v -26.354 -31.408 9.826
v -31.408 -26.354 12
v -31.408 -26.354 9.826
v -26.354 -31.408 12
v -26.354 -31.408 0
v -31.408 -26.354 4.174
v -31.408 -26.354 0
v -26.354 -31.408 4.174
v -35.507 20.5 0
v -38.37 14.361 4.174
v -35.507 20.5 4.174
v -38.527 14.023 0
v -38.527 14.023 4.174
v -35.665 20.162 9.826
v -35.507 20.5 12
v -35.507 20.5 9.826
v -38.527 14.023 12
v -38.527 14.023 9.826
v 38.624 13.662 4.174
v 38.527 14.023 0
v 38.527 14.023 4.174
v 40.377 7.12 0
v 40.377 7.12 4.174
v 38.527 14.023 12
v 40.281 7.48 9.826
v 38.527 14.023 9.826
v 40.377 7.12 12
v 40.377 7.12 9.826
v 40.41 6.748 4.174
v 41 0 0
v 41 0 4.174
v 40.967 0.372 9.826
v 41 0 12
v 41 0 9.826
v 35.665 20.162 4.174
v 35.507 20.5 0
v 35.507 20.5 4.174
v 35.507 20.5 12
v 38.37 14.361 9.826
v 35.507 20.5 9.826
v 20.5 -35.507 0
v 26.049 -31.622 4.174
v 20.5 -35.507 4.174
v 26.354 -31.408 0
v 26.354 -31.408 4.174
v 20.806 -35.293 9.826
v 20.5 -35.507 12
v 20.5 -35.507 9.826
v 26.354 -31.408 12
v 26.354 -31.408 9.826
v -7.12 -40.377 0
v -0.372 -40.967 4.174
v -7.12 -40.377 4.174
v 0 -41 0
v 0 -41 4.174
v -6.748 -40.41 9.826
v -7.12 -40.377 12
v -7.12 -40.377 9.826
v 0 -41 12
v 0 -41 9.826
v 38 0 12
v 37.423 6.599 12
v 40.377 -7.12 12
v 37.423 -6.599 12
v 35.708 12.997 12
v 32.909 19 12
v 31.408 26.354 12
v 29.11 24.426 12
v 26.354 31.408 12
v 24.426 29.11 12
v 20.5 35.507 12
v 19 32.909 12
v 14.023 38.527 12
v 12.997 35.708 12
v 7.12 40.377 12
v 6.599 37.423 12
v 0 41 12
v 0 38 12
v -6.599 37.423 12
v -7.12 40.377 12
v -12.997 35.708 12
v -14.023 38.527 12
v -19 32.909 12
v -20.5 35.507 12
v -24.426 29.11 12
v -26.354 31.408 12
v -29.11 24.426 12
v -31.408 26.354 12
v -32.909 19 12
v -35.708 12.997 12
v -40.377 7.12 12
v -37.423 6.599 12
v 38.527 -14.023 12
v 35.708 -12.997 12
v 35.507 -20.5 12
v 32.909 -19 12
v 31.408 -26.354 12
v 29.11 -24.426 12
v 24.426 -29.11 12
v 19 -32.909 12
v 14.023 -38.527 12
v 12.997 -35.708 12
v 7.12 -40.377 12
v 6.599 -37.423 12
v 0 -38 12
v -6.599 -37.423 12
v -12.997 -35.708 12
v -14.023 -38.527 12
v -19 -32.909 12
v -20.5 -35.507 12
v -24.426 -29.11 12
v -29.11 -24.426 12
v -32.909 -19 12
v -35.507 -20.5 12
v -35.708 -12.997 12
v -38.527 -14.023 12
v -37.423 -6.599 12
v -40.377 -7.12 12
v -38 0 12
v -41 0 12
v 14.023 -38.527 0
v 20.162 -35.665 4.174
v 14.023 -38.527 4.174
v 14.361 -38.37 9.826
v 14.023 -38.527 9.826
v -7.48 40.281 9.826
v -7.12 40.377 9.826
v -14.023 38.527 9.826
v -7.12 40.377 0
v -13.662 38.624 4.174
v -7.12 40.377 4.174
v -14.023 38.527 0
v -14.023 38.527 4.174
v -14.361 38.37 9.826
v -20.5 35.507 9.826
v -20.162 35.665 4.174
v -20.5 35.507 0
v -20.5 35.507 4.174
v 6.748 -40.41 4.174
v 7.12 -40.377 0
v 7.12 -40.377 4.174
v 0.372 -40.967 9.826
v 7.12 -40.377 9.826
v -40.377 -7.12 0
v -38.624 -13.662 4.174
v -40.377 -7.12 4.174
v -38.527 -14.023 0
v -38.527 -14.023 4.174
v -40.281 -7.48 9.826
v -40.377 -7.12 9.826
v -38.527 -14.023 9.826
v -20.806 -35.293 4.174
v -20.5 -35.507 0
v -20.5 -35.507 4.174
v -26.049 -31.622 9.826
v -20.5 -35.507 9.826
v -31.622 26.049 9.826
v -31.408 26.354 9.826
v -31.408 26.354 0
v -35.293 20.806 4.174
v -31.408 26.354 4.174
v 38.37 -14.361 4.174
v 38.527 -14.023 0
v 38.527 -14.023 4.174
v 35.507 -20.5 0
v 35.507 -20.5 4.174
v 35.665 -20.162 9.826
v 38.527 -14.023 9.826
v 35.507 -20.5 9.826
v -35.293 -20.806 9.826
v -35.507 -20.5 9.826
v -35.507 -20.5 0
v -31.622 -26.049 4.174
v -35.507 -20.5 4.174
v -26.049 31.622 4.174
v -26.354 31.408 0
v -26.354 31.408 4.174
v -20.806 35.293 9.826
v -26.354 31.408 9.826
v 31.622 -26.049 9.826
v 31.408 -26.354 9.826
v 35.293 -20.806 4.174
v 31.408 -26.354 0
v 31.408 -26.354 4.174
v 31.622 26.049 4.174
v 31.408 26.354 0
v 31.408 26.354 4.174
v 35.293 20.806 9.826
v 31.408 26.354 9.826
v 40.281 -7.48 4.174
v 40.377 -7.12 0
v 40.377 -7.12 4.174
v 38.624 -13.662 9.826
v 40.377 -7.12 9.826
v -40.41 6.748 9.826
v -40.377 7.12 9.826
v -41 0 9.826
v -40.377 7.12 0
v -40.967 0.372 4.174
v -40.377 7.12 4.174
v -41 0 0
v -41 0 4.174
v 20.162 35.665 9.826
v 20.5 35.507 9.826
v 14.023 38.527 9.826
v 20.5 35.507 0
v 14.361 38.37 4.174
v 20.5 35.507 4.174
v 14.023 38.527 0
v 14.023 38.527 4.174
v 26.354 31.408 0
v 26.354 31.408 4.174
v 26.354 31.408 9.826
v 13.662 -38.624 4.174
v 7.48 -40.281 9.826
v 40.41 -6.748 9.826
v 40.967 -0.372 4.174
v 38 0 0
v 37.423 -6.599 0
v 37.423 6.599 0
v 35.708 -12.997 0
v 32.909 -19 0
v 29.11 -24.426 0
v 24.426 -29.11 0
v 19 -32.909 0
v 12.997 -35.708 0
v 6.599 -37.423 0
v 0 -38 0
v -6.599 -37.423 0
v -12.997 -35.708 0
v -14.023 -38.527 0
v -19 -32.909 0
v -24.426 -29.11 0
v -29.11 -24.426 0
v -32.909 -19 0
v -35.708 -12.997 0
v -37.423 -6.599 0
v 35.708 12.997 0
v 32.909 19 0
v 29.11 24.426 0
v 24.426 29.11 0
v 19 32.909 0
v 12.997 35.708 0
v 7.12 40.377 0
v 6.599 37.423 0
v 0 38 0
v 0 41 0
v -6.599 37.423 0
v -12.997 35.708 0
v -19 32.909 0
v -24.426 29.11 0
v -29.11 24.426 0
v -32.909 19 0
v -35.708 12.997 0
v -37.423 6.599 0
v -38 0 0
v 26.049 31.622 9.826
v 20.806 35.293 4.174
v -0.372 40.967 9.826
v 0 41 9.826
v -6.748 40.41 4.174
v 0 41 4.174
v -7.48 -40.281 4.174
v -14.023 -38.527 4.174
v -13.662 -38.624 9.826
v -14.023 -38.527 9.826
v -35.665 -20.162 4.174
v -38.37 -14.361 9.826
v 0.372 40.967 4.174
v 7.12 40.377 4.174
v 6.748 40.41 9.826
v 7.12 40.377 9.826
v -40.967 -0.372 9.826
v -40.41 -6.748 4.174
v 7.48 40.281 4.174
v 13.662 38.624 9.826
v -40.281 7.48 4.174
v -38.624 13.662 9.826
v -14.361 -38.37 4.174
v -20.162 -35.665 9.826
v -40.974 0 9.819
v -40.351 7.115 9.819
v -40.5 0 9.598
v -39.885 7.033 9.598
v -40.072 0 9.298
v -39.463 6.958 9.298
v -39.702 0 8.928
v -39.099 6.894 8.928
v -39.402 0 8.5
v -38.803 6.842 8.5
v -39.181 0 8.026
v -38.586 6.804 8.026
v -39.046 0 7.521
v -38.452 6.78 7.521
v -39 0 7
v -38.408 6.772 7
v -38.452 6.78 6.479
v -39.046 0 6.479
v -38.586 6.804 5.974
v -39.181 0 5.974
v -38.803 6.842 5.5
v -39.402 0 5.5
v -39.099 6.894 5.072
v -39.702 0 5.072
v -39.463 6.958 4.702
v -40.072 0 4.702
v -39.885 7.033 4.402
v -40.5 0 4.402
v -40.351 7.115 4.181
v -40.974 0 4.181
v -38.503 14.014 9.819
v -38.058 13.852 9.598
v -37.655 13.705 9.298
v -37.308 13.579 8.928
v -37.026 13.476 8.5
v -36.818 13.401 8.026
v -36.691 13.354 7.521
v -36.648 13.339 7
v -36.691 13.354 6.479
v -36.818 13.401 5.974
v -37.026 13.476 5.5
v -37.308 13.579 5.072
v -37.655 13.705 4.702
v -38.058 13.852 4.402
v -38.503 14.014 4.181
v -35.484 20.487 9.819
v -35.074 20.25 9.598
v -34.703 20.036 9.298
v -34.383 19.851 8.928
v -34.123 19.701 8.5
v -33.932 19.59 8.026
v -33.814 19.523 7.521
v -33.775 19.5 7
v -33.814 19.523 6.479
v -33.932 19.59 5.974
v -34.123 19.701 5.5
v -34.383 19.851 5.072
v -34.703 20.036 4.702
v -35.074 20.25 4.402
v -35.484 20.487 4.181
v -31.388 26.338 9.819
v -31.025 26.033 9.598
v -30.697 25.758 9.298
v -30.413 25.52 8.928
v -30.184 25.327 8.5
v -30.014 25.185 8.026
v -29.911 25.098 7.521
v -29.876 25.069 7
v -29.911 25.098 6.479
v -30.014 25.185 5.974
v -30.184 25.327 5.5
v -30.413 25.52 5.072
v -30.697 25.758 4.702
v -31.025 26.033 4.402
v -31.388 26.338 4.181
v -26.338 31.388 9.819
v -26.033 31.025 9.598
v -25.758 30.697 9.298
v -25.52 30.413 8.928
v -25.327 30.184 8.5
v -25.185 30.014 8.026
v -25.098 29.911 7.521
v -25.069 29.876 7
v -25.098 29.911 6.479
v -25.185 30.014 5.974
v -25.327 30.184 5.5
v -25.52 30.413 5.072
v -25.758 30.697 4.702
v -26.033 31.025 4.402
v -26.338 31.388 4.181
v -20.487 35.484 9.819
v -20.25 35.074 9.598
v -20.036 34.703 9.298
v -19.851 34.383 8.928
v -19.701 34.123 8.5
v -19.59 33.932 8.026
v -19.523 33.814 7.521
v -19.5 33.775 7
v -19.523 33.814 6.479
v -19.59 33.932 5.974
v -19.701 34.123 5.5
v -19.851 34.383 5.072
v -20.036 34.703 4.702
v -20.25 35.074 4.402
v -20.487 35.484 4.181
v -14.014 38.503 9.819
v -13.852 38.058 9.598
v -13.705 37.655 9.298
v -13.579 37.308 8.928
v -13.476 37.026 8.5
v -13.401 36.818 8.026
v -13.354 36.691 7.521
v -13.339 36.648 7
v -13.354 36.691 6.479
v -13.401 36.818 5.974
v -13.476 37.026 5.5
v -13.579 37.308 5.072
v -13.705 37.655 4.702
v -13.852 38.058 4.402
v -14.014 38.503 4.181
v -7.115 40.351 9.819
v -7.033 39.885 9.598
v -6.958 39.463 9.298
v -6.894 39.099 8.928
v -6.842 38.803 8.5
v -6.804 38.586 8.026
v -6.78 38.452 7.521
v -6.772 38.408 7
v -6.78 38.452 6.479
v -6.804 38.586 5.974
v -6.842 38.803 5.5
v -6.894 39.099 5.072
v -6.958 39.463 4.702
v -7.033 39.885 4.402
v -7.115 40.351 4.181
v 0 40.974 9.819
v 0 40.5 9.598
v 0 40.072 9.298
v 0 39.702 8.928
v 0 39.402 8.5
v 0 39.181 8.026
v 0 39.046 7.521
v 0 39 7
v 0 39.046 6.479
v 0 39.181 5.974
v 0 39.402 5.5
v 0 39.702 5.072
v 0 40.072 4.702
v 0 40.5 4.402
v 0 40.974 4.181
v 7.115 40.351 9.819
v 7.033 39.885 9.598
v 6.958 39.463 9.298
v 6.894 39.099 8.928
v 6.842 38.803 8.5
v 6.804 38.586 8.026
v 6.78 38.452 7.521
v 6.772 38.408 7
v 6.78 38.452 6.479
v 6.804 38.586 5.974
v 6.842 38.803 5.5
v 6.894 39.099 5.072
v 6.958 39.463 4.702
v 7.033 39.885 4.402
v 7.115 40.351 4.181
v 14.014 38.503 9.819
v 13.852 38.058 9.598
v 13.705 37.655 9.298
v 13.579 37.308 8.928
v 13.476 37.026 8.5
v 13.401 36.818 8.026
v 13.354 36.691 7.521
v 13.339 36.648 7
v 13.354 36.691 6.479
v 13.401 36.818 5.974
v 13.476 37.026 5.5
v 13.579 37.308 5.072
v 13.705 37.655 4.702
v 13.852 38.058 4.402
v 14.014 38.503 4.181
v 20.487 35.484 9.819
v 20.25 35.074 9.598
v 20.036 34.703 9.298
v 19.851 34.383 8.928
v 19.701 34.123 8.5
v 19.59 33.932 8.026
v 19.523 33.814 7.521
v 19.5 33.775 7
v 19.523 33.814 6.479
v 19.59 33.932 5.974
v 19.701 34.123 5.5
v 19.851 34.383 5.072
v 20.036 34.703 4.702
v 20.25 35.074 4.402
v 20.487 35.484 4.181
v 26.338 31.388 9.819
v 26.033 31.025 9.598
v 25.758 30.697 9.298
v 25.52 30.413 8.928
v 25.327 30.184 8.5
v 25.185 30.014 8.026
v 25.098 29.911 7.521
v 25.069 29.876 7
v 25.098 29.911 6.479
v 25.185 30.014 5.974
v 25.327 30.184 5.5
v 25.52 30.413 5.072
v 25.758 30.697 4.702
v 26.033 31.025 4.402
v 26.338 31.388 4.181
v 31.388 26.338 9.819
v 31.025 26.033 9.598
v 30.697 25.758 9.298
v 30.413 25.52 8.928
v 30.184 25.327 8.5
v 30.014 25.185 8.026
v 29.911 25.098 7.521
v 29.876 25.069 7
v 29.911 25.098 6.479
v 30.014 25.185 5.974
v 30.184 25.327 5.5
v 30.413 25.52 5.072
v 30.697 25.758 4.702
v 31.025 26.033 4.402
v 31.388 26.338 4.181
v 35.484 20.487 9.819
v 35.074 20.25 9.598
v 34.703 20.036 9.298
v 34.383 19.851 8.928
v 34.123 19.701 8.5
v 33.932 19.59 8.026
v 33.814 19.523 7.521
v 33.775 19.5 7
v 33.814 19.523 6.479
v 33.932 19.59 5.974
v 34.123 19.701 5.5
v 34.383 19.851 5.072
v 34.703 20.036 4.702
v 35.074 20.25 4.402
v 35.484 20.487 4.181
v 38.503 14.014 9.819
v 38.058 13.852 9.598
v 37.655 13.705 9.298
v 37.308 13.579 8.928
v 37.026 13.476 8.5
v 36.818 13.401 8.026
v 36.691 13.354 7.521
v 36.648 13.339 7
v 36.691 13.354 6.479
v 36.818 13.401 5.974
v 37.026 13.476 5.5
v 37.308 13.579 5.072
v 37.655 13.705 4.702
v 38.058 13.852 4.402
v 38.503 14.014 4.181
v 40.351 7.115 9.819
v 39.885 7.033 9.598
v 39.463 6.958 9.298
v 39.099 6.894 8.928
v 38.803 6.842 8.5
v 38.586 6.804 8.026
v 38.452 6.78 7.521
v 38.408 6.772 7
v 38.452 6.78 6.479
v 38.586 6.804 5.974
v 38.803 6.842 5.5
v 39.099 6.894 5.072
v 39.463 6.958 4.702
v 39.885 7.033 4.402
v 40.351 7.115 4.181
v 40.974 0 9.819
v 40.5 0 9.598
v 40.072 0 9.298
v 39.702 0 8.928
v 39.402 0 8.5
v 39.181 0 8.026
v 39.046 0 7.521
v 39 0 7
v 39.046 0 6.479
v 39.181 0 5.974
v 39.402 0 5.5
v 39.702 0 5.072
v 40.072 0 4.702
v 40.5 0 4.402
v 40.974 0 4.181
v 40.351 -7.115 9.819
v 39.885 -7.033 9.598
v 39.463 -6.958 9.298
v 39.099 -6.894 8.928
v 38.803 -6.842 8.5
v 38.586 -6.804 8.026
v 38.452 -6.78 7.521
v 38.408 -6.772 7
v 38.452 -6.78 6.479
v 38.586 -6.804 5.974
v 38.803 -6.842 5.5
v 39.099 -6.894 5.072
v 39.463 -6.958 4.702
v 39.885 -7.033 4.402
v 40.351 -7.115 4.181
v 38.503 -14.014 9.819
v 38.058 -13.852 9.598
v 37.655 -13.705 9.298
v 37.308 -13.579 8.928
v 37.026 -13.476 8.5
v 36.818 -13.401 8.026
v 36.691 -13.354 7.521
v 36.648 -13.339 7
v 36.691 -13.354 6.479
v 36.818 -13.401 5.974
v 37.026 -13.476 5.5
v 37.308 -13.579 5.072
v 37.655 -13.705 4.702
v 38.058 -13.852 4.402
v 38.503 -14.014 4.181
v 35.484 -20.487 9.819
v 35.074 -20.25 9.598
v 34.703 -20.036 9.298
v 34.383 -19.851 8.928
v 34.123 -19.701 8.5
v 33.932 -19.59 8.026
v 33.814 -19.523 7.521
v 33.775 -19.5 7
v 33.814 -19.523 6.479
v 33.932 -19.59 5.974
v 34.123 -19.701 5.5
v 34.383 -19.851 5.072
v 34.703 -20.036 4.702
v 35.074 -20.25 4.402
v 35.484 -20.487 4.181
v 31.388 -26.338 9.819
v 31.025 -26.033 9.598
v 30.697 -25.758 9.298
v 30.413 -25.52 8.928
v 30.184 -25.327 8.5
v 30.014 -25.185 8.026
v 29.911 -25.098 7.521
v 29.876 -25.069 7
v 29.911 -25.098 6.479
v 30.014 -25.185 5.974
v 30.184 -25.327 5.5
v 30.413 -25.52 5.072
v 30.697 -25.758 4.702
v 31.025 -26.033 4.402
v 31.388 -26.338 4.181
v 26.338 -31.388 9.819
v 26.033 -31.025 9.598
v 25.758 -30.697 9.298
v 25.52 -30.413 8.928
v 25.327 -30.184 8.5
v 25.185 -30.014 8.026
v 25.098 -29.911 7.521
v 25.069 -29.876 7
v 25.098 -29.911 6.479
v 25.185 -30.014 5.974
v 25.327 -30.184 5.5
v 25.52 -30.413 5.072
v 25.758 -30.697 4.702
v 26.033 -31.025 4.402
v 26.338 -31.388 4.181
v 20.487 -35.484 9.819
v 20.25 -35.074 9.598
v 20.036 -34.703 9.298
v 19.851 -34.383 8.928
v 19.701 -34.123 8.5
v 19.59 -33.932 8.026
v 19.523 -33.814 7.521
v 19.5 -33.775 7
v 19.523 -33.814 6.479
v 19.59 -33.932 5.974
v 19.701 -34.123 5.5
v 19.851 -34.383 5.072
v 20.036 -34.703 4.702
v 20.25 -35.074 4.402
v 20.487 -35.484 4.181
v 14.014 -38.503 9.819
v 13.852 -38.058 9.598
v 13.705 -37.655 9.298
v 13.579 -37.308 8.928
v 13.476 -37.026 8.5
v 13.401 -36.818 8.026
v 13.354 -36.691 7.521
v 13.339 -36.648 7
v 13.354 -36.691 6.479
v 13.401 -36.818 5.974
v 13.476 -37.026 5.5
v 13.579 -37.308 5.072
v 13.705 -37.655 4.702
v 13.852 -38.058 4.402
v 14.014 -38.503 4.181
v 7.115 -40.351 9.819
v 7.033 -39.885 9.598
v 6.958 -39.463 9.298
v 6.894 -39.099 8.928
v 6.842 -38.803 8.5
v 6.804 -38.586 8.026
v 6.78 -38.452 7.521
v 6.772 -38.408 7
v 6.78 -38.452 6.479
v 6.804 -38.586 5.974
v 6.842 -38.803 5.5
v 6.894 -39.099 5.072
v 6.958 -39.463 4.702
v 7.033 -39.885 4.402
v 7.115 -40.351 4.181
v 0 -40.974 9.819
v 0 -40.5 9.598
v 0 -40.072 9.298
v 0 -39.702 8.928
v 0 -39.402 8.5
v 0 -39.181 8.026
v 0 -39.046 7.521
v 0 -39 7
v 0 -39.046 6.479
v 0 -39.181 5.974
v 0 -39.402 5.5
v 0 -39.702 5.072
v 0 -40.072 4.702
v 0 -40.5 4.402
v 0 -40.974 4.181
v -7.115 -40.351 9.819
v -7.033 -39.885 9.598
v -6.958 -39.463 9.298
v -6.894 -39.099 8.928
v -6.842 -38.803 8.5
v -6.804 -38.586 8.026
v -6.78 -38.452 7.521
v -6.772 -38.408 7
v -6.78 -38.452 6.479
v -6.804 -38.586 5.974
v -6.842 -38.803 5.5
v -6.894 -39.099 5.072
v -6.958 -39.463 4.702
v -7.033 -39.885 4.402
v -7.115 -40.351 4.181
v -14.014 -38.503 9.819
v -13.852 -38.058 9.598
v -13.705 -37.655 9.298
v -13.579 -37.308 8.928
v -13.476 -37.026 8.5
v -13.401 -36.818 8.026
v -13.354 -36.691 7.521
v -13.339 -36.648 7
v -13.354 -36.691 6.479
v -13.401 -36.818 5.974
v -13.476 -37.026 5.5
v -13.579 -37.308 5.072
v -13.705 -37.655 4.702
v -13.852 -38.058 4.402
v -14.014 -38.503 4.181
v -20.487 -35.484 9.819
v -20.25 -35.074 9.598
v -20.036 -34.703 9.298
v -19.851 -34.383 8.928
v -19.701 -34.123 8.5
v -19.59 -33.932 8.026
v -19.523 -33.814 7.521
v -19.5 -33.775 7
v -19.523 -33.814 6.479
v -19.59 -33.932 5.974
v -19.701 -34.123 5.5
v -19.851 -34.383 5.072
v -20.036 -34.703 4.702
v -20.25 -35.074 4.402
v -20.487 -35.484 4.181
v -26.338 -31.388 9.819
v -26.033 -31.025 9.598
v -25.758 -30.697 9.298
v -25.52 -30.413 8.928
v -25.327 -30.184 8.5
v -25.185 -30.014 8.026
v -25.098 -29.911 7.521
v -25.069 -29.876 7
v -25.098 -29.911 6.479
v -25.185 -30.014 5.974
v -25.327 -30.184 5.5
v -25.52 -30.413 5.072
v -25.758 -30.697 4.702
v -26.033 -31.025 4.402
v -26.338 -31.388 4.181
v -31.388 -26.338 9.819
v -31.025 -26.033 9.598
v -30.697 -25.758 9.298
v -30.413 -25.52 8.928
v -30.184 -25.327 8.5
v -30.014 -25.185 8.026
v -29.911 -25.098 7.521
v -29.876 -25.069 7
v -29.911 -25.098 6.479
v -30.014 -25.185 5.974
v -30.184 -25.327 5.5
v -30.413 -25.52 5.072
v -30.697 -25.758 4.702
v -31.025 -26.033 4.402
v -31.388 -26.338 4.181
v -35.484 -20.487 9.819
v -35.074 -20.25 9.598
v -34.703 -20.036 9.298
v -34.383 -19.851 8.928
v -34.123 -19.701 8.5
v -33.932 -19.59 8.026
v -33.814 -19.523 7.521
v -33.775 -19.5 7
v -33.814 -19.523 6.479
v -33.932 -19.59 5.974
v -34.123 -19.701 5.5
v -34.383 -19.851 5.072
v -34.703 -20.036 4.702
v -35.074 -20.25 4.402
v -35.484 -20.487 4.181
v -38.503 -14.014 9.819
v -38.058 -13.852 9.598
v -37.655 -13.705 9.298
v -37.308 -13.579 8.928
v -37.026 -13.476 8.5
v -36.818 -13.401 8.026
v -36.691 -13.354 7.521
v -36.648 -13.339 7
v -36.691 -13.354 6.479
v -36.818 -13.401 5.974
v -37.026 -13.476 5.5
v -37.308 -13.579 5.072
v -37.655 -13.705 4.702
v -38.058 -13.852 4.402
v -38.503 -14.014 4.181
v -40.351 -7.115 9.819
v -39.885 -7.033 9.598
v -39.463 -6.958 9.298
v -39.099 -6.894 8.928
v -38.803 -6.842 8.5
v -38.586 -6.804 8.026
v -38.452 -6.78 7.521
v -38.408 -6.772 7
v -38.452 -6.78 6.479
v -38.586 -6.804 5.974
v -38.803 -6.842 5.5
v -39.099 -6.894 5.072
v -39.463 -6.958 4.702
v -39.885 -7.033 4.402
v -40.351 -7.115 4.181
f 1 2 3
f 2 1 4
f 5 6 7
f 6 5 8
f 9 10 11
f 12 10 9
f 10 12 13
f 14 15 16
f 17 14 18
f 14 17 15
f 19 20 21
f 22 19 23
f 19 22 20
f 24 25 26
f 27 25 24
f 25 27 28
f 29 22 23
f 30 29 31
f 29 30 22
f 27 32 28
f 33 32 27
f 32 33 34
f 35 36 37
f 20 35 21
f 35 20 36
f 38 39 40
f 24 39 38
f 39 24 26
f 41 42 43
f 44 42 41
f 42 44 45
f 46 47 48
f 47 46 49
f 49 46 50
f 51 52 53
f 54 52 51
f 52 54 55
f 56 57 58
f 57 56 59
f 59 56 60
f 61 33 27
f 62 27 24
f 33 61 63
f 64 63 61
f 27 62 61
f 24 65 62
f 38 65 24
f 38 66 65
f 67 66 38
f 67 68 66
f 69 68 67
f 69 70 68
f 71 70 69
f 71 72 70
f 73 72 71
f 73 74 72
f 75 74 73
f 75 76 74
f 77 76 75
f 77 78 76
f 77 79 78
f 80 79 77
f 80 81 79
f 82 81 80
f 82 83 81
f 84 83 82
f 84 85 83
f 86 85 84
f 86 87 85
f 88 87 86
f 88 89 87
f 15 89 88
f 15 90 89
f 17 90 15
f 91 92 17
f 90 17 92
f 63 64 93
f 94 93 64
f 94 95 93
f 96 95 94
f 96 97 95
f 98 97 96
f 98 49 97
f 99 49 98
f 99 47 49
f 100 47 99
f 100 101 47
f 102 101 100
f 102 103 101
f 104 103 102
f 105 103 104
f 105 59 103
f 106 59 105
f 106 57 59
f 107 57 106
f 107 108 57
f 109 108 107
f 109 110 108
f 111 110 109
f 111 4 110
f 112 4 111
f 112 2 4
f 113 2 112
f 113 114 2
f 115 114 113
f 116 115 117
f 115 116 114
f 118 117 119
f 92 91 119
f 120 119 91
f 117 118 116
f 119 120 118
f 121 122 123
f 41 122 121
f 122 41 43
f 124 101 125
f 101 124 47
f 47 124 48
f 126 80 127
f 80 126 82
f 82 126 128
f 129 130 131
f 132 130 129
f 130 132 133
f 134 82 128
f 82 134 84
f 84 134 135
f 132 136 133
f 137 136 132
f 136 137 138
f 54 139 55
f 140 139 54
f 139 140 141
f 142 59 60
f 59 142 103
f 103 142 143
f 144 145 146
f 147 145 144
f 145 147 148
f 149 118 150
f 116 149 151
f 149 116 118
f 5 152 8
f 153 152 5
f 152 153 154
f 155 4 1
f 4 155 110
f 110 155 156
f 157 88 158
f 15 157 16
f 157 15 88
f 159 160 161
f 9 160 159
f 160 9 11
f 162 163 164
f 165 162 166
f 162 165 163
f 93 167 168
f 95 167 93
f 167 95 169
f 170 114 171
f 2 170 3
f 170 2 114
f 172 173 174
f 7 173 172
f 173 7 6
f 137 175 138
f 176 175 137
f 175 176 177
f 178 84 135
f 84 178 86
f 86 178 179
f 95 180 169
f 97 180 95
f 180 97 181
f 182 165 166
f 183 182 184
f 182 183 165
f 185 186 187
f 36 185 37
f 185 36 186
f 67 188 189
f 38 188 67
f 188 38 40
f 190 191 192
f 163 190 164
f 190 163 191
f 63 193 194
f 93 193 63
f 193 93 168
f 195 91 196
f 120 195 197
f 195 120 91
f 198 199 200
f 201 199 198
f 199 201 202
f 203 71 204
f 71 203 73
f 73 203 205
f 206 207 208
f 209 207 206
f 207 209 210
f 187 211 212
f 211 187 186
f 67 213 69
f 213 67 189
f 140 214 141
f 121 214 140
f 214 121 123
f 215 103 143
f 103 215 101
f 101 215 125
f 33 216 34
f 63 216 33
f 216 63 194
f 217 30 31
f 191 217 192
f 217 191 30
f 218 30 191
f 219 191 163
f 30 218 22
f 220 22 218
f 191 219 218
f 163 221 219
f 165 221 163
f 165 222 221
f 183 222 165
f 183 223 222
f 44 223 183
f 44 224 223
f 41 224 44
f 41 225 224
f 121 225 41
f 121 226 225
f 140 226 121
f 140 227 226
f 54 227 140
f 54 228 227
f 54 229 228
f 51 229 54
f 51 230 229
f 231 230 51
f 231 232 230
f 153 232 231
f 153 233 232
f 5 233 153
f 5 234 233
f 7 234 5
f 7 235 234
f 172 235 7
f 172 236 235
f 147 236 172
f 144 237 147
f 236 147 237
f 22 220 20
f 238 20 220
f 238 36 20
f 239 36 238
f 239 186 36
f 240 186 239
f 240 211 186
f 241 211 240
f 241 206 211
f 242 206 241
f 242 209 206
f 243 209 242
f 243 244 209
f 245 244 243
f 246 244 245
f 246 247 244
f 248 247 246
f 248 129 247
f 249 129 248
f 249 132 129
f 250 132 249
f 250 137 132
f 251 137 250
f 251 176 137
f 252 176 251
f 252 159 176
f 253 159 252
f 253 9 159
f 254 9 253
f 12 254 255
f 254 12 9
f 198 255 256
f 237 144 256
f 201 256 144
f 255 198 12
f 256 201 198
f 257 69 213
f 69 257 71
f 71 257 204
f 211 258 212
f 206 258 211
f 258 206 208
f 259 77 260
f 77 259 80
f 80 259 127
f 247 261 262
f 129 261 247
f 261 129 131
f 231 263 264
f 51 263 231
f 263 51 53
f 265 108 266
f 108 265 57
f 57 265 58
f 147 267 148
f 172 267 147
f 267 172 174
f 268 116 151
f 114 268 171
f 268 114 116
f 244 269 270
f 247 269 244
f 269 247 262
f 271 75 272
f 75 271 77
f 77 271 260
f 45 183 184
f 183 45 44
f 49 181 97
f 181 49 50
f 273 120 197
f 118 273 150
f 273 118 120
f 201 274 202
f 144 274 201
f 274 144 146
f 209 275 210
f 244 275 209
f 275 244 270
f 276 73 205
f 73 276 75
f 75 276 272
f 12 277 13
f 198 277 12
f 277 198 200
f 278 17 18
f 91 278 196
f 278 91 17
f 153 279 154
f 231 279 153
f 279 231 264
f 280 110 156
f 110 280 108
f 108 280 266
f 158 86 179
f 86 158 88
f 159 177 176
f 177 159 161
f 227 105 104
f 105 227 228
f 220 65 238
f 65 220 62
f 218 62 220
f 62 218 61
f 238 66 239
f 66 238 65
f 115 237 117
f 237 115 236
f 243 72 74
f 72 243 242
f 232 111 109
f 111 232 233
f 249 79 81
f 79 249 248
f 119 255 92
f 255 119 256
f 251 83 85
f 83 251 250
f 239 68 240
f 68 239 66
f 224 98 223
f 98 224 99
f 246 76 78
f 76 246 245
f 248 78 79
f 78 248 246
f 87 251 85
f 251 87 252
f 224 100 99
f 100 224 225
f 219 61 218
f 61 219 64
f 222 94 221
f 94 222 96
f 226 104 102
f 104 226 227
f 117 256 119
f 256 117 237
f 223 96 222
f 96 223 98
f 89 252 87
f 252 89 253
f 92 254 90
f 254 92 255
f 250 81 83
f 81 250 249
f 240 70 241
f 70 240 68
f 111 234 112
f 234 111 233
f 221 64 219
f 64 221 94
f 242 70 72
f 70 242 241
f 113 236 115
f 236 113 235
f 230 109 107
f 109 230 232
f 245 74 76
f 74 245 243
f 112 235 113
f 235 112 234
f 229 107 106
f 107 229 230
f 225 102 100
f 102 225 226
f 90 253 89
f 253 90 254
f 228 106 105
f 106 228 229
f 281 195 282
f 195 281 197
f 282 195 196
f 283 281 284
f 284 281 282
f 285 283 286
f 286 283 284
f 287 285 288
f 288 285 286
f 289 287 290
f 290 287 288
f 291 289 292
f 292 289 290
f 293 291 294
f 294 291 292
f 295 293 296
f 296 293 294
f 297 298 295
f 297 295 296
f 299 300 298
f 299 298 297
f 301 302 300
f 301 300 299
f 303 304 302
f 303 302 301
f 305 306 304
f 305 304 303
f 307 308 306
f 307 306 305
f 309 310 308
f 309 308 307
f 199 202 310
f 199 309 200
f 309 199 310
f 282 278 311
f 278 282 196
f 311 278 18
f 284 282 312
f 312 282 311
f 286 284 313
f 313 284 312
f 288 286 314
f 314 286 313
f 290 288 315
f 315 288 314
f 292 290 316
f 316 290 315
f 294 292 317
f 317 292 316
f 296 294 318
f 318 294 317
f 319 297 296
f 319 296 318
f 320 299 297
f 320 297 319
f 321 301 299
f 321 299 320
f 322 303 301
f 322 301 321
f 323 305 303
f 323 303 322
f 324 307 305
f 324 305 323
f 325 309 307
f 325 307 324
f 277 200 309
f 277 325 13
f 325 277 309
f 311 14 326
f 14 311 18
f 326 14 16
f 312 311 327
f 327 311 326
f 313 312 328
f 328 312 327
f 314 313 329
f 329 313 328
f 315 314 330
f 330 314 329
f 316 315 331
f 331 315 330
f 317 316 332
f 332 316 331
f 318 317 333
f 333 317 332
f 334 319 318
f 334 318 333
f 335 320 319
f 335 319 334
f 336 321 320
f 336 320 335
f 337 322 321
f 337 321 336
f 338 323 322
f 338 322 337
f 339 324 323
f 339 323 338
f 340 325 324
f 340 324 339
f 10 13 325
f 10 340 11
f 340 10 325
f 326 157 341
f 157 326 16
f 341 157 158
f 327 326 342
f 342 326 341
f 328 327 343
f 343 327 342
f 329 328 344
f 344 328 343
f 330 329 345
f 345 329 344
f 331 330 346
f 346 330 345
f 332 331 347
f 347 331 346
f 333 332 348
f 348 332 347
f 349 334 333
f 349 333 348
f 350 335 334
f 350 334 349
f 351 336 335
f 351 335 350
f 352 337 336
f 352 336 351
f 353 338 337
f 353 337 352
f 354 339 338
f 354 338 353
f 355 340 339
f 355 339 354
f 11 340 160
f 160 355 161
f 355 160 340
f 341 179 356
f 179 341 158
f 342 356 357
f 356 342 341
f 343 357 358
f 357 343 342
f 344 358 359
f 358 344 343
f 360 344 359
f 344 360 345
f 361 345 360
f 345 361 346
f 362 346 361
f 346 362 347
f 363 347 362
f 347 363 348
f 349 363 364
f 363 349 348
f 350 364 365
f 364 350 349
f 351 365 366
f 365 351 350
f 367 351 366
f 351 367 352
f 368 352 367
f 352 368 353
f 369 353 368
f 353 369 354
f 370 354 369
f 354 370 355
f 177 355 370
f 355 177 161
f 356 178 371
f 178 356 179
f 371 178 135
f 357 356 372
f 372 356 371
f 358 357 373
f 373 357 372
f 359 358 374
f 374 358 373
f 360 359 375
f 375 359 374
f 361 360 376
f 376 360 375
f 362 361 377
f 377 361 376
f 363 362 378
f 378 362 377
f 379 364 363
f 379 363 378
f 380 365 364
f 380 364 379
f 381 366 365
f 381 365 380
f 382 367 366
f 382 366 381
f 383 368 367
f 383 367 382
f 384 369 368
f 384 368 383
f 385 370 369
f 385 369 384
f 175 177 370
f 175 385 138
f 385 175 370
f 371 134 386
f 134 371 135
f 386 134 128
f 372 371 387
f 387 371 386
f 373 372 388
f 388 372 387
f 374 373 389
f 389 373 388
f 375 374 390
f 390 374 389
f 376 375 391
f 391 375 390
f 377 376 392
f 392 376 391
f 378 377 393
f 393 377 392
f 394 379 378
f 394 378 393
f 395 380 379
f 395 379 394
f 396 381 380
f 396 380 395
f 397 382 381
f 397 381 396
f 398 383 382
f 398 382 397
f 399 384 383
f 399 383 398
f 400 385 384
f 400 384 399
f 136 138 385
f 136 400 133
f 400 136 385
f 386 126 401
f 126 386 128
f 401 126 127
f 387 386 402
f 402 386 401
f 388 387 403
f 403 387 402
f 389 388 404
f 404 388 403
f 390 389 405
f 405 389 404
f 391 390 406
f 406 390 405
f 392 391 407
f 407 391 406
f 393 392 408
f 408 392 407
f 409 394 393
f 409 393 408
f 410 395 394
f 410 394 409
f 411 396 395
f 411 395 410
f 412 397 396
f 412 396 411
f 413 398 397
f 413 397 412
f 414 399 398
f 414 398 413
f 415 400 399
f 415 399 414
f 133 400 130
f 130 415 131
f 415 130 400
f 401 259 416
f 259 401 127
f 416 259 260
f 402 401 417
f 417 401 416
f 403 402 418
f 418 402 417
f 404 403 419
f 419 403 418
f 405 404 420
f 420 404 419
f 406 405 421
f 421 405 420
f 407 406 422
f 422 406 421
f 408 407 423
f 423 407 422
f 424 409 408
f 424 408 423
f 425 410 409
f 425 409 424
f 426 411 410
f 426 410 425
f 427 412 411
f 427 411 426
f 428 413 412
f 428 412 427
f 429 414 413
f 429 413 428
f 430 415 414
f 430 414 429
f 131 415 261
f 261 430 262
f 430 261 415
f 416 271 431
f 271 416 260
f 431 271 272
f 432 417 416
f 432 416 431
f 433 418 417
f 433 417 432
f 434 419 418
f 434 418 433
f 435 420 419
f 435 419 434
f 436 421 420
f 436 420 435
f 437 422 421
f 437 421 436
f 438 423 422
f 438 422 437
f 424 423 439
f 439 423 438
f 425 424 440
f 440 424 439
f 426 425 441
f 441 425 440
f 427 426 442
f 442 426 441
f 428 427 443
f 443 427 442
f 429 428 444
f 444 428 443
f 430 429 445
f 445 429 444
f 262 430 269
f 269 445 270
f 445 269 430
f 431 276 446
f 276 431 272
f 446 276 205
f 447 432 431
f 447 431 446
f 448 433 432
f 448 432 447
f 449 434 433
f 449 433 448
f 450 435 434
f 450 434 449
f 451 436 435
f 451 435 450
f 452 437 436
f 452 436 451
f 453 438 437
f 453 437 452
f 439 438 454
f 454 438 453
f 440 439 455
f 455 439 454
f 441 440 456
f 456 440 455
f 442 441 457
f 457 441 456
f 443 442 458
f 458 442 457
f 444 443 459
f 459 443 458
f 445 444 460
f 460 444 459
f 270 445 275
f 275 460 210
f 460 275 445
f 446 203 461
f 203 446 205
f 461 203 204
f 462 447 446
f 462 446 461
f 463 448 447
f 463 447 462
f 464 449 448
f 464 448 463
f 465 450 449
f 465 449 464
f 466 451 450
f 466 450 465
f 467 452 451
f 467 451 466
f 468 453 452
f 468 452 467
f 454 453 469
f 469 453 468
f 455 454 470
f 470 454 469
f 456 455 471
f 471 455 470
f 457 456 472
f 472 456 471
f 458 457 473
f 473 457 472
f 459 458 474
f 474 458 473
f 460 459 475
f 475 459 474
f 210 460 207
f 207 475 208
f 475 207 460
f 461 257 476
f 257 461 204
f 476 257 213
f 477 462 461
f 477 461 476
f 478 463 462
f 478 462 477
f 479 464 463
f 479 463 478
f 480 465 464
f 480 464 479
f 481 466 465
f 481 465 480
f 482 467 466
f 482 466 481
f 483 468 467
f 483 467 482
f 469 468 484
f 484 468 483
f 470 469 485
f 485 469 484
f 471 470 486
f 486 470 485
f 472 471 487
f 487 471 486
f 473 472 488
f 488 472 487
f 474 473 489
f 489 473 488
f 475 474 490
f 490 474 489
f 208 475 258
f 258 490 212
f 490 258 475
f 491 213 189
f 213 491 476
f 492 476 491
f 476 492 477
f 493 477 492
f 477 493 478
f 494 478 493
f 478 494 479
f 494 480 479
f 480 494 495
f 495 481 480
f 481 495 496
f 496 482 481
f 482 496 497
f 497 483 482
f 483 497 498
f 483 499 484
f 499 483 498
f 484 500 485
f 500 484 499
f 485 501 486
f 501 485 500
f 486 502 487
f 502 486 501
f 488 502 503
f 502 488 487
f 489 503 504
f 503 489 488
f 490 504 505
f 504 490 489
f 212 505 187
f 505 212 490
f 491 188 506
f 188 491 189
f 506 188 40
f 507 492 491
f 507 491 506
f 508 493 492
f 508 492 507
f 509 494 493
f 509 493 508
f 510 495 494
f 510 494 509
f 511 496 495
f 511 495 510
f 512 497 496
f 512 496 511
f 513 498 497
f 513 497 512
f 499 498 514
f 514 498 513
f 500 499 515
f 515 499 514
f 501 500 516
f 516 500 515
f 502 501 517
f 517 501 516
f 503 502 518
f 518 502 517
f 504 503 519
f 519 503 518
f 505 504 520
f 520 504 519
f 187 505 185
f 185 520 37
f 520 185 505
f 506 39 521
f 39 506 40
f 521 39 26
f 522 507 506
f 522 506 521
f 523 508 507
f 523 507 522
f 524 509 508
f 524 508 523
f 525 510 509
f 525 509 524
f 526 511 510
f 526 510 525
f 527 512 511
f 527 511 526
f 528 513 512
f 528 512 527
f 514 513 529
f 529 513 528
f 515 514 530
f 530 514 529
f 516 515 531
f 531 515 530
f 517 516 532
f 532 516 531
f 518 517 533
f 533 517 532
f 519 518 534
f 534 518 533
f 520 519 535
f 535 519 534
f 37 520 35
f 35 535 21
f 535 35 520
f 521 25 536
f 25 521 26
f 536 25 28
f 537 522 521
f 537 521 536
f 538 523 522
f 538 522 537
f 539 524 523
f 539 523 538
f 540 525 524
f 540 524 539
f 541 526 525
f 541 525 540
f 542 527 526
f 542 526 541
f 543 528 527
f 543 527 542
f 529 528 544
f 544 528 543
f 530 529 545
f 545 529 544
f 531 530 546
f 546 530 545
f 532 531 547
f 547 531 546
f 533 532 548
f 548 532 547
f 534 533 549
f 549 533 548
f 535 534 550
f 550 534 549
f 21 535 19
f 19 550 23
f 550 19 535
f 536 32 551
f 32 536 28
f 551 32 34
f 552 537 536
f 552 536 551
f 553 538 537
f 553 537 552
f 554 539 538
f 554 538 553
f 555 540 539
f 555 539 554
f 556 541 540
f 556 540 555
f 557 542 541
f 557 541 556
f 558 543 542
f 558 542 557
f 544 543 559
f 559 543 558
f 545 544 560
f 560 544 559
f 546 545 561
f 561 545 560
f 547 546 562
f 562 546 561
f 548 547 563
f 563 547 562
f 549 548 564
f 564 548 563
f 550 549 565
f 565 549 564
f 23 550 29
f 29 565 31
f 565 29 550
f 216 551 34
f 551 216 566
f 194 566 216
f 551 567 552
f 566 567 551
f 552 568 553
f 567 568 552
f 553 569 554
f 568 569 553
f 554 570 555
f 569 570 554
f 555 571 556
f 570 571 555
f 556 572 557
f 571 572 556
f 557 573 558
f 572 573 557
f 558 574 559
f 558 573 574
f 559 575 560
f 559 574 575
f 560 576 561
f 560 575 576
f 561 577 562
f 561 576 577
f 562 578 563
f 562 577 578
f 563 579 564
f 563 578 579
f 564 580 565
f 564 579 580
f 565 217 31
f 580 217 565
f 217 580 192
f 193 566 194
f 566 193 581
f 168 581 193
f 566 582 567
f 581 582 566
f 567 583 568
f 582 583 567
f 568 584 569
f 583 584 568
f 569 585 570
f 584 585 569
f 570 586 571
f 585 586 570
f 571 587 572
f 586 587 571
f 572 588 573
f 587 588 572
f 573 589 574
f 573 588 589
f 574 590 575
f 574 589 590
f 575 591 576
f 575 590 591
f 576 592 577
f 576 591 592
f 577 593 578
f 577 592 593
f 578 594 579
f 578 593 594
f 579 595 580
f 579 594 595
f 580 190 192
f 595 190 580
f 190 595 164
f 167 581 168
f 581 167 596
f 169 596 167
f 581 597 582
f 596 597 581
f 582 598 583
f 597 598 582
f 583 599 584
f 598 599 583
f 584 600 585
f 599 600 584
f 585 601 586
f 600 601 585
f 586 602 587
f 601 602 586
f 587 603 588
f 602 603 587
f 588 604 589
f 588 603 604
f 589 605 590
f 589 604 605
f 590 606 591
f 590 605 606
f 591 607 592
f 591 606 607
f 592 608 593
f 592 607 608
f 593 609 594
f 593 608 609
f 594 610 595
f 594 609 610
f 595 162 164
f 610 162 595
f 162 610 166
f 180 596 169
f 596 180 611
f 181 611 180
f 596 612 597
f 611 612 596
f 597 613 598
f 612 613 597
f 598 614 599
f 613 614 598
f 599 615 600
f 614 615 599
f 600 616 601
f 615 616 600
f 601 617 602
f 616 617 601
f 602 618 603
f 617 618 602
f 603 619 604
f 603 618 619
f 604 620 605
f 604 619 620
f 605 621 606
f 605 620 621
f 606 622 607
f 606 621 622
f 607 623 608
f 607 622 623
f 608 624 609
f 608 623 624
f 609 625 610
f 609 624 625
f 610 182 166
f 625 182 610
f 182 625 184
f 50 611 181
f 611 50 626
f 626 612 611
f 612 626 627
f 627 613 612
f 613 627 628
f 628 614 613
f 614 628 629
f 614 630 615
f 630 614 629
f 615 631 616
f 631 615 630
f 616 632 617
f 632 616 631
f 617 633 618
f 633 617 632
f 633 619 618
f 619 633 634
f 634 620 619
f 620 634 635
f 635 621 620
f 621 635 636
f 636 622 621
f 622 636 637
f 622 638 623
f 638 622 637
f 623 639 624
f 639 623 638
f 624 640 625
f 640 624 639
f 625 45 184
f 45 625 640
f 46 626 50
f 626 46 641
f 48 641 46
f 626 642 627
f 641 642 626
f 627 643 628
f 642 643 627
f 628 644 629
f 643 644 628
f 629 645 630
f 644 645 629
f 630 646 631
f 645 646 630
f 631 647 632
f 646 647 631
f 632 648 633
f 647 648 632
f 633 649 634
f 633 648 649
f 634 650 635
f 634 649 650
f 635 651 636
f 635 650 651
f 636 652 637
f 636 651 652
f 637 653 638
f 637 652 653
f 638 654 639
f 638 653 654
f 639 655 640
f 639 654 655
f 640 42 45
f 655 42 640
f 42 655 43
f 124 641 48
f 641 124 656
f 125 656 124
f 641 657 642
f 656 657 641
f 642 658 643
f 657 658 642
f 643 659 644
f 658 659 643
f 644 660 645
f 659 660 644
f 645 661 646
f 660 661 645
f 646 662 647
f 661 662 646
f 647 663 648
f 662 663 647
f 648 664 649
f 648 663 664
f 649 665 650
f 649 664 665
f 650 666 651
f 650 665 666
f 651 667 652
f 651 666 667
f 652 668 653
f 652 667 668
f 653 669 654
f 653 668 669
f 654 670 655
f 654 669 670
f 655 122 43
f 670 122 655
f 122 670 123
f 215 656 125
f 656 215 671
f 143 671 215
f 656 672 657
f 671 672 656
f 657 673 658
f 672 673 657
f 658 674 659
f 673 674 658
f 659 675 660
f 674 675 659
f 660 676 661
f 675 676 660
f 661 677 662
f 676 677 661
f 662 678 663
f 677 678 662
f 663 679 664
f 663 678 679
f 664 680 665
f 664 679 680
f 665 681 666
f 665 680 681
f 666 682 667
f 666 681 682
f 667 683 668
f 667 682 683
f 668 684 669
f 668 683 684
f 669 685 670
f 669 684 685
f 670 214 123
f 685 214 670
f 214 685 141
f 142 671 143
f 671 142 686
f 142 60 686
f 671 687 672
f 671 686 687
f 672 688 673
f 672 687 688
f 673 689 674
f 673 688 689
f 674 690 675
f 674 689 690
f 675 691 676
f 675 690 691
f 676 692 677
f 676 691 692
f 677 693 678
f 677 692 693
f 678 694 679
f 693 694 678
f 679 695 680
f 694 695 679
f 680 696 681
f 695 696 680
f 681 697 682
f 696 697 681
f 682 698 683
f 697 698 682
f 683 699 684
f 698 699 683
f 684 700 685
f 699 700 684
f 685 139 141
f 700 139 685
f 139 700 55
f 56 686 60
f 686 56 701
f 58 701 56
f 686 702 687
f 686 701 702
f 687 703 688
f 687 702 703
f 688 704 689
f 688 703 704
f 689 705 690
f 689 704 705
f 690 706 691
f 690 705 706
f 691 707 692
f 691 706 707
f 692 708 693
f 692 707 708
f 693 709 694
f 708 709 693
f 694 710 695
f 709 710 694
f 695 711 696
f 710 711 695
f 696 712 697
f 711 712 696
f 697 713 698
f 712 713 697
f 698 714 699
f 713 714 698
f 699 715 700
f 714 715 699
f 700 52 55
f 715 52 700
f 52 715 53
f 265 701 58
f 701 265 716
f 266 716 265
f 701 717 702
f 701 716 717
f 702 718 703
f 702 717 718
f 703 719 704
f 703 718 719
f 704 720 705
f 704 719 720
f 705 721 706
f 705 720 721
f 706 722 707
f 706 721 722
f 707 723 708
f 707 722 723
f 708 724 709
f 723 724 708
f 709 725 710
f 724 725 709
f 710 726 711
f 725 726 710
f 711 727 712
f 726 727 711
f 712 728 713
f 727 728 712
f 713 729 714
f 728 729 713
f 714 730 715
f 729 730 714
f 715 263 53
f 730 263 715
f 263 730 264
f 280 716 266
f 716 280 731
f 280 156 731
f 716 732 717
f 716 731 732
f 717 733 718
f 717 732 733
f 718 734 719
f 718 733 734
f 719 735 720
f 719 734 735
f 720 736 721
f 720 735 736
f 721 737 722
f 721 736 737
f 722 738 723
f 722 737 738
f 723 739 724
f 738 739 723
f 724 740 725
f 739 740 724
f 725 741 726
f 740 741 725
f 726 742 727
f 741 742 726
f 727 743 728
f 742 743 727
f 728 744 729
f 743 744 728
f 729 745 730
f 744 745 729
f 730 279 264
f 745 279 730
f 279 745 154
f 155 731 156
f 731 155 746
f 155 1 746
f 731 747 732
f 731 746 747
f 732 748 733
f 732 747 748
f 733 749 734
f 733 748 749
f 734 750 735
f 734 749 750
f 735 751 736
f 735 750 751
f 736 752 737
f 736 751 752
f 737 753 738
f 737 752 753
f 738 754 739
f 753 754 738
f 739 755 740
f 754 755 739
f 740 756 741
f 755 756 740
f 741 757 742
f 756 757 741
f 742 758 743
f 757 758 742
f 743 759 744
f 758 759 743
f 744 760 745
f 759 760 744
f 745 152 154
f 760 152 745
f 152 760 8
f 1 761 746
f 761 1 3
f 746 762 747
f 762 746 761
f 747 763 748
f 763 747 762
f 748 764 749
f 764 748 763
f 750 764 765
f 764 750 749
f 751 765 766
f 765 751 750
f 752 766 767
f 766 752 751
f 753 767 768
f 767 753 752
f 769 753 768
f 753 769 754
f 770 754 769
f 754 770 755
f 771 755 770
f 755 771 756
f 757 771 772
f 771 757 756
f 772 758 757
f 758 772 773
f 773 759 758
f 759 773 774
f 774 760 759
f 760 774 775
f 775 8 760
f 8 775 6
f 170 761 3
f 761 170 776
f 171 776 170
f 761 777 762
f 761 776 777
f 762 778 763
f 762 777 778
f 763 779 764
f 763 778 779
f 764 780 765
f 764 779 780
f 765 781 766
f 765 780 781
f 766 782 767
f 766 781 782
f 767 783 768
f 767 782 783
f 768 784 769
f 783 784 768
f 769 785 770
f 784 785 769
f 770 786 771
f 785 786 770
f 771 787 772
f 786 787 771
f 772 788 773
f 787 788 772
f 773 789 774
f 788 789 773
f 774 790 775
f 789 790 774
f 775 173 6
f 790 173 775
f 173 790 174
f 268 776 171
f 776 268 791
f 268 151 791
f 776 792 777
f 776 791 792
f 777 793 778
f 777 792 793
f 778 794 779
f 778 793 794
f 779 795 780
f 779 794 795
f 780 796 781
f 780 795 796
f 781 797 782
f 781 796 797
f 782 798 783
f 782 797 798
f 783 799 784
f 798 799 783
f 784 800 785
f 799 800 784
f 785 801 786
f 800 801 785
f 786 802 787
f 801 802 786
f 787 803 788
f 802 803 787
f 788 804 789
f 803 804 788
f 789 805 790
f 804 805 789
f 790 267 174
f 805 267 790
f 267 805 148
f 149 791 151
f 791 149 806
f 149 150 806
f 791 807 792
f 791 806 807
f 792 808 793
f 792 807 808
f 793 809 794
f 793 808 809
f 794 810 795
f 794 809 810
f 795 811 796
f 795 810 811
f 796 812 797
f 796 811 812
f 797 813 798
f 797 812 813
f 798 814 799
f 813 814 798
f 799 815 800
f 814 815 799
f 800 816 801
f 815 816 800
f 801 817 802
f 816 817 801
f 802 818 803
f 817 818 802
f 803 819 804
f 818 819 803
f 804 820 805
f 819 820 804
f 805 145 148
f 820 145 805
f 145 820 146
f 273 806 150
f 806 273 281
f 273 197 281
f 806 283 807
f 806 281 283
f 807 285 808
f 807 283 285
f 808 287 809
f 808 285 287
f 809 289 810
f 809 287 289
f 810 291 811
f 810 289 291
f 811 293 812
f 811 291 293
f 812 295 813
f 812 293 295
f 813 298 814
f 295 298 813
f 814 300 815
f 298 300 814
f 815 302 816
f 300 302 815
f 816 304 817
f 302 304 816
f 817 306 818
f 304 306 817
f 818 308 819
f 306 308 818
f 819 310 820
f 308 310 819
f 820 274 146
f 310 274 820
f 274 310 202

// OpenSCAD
//base for moon lamp


draftingFNs = 36;
renderFNs = 180;
$fn = draftingFNs;

baseHeight = 12;

//translate([26,4,20]){
//    import("/tank/projects/3d-printing/new-files/lampShade-base.stl");
//}

difference(){
    //outer wall
    cylinder(baseHeight,82/2,82/2);
    //remore inner void
    cylinder(baseHeight,76/2,76/2);
    
    //TODO check dimensions of printed object, make shorter? move lower? deeper?
    //remove screw lip/torus
    translate([0,0,7]){
        rotate_extrude(){
            translate([42,0,0]){
                circle(baseHeight/2/2);
            }
        }
    }
}


//TODO make cavity for metal ring - below screw lip? so then that part can't deform (as easily)?
        
